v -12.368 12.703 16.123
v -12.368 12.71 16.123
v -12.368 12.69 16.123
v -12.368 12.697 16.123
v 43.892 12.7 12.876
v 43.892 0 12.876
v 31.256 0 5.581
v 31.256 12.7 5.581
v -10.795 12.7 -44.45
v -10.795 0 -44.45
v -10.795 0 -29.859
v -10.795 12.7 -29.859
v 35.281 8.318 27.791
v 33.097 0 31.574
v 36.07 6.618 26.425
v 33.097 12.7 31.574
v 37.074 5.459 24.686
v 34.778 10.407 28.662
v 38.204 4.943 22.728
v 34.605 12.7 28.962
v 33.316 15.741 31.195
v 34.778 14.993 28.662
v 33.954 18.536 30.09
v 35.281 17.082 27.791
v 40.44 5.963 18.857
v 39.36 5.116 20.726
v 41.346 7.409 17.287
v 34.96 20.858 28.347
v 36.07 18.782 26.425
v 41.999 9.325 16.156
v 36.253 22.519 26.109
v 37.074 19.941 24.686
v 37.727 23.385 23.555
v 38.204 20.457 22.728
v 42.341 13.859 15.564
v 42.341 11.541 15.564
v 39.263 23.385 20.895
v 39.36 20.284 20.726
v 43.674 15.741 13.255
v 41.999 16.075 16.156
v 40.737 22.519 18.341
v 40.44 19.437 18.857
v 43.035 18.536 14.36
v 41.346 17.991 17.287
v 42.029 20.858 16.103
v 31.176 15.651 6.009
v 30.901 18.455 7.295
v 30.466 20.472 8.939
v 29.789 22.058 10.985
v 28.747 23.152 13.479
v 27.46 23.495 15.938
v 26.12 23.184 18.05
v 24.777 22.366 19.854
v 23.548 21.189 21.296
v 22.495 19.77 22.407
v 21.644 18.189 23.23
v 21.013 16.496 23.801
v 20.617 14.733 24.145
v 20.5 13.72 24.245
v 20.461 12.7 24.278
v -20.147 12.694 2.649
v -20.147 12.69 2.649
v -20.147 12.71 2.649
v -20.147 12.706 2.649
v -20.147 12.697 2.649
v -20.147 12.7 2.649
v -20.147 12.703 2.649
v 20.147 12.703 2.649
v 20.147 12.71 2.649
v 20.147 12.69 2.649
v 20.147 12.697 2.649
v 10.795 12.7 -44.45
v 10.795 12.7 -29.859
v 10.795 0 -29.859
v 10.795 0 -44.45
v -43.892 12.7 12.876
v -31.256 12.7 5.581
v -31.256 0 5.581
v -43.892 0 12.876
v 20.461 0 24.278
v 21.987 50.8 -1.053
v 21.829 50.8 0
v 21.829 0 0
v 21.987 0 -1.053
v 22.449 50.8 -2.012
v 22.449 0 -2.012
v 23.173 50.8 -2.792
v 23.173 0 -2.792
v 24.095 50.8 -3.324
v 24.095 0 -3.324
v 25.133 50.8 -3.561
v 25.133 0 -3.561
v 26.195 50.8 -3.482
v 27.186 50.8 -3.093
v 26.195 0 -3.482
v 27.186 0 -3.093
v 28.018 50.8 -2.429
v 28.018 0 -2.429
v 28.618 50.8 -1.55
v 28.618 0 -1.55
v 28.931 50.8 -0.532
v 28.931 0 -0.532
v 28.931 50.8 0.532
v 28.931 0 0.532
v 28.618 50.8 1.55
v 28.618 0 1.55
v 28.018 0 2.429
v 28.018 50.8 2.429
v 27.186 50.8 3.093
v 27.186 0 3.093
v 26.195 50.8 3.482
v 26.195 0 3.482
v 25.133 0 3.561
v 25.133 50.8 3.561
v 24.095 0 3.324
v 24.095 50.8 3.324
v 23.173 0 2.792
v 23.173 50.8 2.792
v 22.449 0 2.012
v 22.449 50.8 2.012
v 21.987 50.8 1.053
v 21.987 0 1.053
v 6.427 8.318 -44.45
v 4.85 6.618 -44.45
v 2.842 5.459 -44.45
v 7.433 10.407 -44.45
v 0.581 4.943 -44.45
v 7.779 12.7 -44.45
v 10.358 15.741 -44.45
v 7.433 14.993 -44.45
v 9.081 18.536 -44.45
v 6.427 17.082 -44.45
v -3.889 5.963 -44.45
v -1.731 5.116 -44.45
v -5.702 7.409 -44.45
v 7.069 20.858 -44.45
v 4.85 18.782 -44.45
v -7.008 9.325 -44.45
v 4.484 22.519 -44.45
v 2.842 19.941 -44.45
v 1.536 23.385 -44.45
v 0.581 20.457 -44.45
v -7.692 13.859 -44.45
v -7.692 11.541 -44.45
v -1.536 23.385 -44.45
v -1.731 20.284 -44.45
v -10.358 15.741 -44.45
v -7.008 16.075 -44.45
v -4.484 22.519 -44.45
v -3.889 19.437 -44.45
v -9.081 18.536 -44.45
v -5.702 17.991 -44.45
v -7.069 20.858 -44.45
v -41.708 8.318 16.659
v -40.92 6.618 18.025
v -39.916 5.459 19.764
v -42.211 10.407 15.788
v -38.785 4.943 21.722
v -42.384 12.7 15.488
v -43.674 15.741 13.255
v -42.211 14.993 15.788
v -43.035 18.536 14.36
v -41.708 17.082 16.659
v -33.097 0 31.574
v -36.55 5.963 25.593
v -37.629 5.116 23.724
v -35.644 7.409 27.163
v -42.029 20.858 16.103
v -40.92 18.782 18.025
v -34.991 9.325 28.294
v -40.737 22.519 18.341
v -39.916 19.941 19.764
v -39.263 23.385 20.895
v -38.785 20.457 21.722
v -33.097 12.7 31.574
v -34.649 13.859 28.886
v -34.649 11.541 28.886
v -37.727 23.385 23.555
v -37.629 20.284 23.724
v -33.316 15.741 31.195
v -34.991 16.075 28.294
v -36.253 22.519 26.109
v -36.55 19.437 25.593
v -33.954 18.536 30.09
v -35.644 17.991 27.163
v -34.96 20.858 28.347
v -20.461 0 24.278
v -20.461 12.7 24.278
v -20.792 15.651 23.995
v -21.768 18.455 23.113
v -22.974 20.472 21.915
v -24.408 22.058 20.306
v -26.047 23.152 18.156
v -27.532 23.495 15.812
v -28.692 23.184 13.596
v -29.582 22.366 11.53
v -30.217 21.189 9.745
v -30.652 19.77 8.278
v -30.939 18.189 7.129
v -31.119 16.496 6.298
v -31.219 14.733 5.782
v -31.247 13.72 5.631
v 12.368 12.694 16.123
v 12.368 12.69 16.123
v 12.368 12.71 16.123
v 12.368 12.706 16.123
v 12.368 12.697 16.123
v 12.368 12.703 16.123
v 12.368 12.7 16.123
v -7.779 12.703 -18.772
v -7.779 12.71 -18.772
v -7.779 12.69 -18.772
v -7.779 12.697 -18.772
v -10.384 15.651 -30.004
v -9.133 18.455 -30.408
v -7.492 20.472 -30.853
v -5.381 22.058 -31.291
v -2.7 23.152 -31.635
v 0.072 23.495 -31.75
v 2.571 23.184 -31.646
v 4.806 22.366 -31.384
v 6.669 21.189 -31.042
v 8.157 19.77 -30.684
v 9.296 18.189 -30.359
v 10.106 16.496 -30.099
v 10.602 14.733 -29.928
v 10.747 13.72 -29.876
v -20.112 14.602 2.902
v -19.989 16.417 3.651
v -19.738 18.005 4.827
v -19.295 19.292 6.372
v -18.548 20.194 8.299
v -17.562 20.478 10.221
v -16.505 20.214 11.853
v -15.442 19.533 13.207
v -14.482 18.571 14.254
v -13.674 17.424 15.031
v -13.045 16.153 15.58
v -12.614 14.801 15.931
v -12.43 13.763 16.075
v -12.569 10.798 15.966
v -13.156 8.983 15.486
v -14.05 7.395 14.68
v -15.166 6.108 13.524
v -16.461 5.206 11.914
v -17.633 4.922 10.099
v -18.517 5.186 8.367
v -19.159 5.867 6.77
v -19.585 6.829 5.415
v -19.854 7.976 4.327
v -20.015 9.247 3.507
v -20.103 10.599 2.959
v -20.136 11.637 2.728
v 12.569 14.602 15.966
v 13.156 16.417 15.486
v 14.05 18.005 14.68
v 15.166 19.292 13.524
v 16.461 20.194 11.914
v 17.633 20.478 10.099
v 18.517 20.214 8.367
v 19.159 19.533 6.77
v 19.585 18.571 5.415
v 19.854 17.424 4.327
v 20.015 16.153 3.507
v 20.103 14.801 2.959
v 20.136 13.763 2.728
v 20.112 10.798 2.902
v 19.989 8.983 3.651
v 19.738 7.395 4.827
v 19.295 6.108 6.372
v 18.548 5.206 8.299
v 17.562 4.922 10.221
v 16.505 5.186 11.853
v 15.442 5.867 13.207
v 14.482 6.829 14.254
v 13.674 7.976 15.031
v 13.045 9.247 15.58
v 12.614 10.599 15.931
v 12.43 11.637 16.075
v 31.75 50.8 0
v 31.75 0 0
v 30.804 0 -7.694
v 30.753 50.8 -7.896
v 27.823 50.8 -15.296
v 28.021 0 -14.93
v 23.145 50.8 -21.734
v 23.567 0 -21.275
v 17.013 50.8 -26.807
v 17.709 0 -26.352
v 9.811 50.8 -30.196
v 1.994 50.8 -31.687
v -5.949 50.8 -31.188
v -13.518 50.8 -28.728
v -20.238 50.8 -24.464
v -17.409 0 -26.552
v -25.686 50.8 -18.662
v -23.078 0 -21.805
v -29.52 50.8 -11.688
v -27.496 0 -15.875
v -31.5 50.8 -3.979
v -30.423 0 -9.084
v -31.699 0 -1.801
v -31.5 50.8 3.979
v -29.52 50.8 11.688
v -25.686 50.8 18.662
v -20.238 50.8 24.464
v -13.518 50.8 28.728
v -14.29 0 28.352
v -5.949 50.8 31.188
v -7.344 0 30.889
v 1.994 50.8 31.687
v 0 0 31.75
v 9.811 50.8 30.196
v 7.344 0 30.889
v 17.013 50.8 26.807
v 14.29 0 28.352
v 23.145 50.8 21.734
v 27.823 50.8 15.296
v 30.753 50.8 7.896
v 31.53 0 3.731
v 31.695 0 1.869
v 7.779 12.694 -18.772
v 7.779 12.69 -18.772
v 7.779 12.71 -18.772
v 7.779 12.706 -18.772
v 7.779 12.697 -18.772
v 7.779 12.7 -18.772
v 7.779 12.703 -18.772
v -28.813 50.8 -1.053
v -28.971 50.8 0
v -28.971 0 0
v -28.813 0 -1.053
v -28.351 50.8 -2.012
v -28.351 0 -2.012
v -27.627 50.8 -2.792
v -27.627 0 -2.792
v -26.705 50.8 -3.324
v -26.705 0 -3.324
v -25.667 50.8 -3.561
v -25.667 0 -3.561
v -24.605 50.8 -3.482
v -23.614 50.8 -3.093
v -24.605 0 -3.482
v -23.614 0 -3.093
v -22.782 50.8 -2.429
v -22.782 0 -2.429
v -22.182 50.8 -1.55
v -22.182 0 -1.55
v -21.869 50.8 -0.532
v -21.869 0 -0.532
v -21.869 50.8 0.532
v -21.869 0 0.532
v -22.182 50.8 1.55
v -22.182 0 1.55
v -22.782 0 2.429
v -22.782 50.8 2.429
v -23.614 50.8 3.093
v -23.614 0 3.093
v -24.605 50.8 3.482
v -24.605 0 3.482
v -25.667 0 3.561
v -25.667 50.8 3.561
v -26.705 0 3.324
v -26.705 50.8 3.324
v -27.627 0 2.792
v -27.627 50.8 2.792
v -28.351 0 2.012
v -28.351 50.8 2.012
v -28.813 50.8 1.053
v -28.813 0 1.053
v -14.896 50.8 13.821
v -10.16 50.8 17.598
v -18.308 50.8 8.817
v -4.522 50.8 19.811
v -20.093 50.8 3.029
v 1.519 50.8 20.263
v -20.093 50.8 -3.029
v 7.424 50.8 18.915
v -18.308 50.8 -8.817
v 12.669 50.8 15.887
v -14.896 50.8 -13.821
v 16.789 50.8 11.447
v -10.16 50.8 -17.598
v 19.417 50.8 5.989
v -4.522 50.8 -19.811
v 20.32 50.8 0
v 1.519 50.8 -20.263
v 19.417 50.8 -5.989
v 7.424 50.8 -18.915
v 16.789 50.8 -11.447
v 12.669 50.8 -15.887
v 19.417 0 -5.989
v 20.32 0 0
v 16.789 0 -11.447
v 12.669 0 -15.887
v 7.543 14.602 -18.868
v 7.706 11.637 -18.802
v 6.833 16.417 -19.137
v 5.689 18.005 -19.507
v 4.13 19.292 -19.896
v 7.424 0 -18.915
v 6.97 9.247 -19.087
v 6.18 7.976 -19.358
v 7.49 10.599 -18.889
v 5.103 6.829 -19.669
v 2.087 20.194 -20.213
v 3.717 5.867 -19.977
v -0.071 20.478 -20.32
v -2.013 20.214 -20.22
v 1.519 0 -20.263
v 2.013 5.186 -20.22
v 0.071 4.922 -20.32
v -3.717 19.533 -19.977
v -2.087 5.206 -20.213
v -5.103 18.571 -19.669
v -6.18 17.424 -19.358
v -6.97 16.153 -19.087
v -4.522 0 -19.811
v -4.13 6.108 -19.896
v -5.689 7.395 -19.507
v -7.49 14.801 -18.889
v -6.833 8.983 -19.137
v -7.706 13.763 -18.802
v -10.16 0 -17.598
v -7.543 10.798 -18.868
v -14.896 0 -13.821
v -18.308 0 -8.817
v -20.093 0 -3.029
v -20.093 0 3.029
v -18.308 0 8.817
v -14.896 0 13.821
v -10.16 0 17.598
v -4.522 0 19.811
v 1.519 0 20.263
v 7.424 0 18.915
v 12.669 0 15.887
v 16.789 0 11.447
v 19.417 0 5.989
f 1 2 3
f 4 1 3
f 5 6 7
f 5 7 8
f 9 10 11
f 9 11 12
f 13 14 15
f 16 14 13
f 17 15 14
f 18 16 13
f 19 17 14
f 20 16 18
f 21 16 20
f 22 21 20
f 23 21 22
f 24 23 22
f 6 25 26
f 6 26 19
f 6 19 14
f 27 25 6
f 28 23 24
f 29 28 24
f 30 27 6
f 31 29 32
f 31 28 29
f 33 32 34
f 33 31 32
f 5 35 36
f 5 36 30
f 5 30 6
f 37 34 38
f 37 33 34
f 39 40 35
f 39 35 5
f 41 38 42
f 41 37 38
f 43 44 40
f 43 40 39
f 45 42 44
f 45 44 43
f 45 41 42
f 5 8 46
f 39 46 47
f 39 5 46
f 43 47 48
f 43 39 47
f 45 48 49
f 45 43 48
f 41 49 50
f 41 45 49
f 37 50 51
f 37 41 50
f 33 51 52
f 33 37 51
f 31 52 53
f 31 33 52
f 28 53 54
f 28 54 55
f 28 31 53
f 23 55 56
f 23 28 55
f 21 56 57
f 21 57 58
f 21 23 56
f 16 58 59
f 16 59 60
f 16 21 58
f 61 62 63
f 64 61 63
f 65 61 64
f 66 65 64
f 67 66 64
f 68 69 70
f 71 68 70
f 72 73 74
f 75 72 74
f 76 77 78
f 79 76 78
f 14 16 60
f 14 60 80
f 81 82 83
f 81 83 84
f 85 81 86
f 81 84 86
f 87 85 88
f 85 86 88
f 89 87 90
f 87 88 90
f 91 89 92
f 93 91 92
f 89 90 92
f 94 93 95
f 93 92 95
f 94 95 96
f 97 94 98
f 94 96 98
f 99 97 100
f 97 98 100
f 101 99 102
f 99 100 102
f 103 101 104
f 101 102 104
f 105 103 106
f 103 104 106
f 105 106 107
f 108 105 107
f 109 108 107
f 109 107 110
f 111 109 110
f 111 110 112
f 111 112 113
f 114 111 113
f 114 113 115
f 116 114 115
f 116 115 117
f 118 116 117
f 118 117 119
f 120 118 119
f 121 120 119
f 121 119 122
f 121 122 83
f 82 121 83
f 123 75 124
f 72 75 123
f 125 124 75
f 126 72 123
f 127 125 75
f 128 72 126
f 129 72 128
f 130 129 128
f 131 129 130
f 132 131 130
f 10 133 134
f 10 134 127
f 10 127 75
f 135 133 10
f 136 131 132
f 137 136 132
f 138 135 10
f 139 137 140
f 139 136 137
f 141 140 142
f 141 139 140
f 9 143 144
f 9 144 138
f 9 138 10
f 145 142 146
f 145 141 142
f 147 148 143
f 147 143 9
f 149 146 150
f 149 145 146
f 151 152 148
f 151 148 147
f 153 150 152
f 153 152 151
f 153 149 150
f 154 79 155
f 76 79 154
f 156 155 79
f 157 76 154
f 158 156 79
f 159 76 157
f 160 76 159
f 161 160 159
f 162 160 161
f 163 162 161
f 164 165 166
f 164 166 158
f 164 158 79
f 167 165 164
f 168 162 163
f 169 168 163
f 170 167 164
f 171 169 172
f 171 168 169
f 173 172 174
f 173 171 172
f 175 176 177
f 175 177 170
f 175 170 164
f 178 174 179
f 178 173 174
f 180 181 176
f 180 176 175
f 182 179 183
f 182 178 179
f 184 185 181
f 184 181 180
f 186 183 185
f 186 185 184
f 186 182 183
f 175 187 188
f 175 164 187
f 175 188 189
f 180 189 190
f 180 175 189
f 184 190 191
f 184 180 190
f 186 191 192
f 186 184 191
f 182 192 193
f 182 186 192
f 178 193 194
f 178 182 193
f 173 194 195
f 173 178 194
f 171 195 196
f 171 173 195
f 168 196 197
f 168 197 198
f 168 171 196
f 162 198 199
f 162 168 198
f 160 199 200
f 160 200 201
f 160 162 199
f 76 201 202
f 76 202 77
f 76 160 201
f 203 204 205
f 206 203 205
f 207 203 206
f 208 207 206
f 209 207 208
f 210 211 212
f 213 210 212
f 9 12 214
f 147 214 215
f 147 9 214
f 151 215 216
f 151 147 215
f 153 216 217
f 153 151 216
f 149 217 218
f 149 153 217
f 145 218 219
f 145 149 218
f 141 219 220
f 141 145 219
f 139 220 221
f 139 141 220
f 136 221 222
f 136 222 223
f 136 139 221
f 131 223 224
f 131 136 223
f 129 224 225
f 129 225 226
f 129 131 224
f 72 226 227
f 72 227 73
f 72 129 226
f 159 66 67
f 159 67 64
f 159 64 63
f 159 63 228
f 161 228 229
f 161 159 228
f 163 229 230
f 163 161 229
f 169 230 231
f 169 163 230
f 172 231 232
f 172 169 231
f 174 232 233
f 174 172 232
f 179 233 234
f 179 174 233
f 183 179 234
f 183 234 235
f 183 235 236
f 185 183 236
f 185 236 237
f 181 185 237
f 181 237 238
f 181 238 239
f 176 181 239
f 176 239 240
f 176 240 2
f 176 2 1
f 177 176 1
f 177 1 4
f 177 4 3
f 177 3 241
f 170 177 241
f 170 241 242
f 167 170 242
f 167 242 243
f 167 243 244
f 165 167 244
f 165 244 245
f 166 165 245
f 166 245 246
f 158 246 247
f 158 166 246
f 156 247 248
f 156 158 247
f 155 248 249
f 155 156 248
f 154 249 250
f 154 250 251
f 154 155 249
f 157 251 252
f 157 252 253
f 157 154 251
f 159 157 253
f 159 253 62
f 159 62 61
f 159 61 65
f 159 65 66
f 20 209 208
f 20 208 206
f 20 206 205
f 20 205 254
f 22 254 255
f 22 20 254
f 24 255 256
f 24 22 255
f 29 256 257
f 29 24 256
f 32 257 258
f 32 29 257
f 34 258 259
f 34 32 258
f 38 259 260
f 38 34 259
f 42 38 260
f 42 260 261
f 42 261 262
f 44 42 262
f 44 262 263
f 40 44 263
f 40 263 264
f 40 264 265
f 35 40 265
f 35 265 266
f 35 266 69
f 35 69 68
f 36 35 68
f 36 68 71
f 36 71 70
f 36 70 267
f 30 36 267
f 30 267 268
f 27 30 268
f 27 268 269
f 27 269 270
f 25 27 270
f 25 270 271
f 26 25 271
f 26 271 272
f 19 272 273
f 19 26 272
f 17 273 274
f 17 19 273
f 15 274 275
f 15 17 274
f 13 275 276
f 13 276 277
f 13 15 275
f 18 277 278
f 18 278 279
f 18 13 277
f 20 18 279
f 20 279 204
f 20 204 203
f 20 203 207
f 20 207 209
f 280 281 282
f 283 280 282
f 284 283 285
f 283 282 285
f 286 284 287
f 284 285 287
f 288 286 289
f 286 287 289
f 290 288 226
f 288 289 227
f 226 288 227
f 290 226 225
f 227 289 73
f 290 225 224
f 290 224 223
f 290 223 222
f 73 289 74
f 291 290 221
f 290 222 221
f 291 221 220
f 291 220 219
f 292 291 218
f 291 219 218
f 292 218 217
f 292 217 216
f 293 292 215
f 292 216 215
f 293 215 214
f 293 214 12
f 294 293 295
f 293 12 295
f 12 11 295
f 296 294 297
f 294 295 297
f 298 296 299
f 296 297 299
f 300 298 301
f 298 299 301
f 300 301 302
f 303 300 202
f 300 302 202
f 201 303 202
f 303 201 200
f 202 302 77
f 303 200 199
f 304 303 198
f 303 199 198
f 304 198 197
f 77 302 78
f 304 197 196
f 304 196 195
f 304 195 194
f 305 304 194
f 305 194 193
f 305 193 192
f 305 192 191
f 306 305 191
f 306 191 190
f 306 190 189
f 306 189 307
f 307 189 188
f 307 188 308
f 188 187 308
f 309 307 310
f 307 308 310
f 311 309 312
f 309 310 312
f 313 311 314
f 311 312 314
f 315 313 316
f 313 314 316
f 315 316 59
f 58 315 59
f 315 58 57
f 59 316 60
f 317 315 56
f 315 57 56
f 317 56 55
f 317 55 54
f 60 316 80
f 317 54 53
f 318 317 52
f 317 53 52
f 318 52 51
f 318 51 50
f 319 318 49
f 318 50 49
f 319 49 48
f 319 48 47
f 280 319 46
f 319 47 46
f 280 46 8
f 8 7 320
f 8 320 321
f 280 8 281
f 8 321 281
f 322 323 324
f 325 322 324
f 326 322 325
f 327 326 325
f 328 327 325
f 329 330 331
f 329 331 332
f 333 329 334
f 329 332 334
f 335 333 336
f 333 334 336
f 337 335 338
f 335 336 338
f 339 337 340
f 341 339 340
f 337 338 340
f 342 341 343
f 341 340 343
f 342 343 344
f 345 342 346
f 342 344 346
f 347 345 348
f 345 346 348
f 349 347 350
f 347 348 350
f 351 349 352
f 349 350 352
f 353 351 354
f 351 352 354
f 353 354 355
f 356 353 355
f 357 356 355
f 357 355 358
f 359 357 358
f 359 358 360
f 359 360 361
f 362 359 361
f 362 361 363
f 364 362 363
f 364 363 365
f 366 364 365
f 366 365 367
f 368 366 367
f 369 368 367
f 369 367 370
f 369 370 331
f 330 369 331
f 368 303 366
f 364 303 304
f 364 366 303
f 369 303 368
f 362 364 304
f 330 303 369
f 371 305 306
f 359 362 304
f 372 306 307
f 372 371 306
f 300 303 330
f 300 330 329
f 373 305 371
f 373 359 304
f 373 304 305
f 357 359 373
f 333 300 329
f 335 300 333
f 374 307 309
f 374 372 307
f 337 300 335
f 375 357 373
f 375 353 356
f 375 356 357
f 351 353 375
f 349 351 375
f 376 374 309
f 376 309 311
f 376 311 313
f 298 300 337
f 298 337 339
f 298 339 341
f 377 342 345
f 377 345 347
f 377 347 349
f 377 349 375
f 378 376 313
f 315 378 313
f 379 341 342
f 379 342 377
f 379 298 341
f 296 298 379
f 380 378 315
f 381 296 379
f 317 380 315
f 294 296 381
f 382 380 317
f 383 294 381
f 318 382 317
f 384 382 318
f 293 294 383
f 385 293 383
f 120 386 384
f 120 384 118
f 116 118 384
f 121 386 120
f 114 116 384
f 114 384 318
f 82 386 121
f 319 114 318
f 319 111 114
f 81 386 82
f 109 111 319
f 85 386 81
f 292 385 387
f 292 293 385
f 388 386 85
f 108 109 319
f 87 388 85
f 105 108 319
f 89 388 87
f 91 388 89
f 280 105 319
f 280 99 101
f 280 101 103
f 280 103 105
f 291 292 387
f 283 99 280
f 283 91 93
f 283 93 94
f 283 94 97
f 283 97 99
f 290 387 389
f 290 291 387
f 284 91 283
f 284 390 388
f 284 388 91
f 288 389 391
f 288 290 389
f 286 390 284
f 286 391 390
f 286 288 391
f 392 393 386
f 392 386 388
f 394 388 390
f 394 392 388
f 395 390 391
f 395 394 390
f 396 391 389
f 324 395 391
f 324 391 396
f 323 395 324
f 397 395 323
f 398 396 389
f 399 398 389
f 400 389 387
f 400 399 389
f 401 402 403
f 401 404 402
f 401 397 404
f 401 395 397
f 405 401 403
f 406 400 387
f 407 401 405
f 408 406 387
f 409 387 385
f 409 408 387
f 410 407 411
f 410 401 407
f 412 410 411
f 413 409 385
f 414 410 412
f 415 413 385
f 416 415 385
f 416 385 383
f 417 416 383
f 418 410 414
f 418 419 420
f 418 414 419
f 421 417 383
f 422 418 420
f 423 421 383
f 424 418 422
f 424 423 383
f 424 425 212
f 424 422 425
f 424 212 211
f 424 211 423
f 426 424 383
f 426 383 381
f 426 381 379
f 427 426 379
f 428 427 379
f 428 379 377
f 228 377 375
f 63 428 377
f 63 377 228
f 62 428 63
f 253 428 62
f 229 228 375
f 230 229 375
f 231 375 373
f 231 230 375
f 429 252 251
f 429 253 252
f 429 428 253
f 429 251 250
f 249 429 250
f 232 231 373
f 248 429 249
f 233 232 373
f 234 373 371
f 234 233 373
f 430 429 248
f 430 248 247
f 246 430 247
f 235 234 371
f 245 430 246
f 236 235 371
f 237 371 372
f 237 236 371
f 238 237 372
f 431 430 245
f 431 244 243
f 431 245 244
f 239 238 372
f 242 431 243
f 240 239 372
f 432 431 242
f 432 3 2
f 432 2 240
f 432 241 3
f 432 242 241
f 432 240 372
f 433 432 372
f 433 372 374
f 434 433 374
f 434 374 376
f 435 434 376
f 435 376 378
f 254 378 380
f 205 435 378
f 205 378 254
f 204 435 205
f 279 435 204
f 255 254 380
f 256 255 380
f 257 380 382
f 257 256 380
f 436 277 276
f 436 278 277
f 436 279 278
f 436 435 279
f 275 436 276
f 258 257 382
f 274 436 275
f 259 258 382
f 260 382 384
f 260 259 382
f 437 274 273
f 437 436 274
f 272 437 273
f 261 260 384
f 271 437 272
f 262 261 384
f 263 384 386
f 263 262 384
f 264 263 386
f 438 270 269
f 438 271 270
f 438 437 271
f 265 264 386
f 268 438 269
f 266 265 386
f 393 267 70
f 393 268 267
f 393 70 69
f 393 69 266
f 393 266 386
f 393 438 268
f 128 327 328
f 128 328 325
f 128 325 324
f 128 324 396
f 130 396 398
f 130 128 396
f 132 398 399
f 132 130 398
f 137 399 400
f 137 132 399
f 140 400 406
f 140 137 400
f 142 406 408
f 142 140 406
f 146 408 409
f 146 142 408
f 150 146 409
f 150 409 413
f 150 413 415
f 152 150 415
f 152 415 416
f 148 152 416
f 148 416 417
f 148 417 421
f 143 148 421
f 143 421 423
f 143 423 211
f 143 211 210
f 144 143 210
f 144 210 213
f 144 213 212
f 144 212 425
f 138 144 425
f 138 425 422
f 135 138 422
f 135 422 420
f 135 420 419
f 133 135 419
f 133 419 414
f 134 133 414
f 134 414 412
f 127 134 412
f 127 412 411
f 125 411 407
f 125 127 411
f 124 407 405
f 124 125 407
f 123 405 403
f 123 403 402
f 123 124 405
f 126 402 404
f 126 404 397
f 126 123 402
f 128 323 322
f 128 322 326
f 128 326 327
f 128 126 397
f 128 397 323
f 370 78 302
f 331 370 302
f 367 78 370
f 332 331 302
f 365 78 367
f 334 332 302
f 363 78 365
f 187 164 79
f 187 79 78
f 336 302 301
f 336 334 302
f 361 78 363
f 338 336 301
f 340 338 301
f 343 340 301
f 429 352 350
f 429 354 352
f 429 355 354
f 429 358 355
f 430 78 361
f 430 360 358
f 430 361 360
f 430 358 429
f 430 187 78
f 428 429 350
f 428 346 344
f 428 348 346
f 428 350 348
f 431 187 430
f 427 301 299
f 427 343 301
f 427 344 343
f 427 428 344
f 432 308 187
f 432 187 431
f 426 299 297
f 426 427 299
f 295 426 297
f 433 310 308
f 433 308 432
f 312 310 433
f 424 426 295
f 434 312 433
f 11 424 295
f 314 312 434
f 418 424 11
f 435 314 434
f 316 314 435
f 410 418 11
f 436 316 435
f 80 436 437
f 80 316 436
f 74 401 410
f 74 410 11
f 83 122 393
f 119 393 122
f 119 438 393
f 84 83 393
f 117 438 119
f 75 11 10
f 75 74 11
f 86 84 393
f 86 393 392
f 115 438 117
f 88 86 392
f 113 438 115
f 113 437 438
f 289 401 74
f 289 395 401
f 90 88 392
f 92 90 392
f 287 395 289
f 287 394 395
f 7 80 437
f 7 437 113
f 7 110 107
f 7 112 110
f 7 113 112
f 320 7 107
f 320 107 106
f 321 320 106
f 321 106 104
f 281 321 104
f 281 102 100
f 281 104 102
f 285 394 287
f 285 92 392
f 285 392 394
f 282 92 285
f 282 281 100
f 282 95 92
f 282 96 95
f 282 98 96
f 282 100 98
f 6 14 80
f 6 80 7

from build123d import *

# Parameters (mm, degrees)
SKETCH1_R               = 31.75
SKETCH1_R_2             = 20.32
BOSS_EXTRUDE1_DEPTH     = 50.8
BOSS_EXTRUDE2_START     = -12.7
SKETCH2_R               = 7.77875
BOSS_EXTRUDE2_DEPTH     = 14.591493
SKETCH2_2_R             = 7.77875
CUT_EXTRUDE1_DEPTH      = 12.977852
CIRPATTERN1_COUNT       = 3
F_1_4_CLEARANCE_HOLE1_D = 7.14248


with BuildPart() as part:
    # Sketch1 → Boss-Extrude1 (new body)
    with BuildSketch(Plane(origin=(0, 0, 0), x_dir=(1, 0, 0), z_dir=(0, 1, 0))):
        Circle(SKETCH1_R)
        Circle(SKETCH1_R_2, mode=Mode.SUBTRACT)
    extrude(amount=BOSS_EXTRUDE1_DEPTH)

    # Sketch2 → Boss-Extrude2 (add)
    with BuildSketch(Plane.XY.offset(-31.75).offset(BOSS_EXTRUDE2_START)):
        with BuildLine():
            Line((10.795, 12.7), (10.795, 0))
            Line((10.795, 0), (-10.795, 0))
            Line((-10.795, 0), (-10.795, 12.7))
            ThreePointArc((-10.795, 12.7), (0, 23.495), (10.795, 12.7))
        make_face()
        with Locations((0, 12.7)):
            Circle(SKETCH2_R, mode=Mode.SUBTRACT)
    boss_extrude2 = extrude(amount=BOSS_EXTRUDE2_DEPTH)

    # Sketch2<2> → Cut-Extrude1 (cut)
    with BuildSketch(Plane.XY.offset(-31.75)):
        with Locations((0, 12.7)):
            Circle(SKETCH2_2_R)
    cut_extrude1 = extrude(amount=CUT_EXTRUDE1_DEPTH, mode=Mode.SUBTRACT)

    # CirPattern1: Boss-Extrude2, Cut-Extrude1 ×3 about axis
    cirpattern1_axis = Axis((0, 0, 0), (0, 1, 0))
    for i in range(1, CIRPATTERN1_COUNT):
        add(boss_extrude2.rotate(cirpattern1_axis, i * 360 / CIRPATTERN1_COUNT))
        add(cut_extrude1.rotate(cirpattern1_axis, i * 360 / CIRPATTERN1_COUNT), mode=Mode.SUBTRACT)

    # 1/4 Clearance Hole1 (through all)
    with Locations(Plane(origin=(0, 50.8, 0), x_dir=(1, 0, 0), z_dir=(0, 1, 0))):
        with Locations((-25.4, 0), (25.4, 0)):
            Hole(F_1_4_CLEARANCE_HOLE1_D / 2)


solid = part.part
